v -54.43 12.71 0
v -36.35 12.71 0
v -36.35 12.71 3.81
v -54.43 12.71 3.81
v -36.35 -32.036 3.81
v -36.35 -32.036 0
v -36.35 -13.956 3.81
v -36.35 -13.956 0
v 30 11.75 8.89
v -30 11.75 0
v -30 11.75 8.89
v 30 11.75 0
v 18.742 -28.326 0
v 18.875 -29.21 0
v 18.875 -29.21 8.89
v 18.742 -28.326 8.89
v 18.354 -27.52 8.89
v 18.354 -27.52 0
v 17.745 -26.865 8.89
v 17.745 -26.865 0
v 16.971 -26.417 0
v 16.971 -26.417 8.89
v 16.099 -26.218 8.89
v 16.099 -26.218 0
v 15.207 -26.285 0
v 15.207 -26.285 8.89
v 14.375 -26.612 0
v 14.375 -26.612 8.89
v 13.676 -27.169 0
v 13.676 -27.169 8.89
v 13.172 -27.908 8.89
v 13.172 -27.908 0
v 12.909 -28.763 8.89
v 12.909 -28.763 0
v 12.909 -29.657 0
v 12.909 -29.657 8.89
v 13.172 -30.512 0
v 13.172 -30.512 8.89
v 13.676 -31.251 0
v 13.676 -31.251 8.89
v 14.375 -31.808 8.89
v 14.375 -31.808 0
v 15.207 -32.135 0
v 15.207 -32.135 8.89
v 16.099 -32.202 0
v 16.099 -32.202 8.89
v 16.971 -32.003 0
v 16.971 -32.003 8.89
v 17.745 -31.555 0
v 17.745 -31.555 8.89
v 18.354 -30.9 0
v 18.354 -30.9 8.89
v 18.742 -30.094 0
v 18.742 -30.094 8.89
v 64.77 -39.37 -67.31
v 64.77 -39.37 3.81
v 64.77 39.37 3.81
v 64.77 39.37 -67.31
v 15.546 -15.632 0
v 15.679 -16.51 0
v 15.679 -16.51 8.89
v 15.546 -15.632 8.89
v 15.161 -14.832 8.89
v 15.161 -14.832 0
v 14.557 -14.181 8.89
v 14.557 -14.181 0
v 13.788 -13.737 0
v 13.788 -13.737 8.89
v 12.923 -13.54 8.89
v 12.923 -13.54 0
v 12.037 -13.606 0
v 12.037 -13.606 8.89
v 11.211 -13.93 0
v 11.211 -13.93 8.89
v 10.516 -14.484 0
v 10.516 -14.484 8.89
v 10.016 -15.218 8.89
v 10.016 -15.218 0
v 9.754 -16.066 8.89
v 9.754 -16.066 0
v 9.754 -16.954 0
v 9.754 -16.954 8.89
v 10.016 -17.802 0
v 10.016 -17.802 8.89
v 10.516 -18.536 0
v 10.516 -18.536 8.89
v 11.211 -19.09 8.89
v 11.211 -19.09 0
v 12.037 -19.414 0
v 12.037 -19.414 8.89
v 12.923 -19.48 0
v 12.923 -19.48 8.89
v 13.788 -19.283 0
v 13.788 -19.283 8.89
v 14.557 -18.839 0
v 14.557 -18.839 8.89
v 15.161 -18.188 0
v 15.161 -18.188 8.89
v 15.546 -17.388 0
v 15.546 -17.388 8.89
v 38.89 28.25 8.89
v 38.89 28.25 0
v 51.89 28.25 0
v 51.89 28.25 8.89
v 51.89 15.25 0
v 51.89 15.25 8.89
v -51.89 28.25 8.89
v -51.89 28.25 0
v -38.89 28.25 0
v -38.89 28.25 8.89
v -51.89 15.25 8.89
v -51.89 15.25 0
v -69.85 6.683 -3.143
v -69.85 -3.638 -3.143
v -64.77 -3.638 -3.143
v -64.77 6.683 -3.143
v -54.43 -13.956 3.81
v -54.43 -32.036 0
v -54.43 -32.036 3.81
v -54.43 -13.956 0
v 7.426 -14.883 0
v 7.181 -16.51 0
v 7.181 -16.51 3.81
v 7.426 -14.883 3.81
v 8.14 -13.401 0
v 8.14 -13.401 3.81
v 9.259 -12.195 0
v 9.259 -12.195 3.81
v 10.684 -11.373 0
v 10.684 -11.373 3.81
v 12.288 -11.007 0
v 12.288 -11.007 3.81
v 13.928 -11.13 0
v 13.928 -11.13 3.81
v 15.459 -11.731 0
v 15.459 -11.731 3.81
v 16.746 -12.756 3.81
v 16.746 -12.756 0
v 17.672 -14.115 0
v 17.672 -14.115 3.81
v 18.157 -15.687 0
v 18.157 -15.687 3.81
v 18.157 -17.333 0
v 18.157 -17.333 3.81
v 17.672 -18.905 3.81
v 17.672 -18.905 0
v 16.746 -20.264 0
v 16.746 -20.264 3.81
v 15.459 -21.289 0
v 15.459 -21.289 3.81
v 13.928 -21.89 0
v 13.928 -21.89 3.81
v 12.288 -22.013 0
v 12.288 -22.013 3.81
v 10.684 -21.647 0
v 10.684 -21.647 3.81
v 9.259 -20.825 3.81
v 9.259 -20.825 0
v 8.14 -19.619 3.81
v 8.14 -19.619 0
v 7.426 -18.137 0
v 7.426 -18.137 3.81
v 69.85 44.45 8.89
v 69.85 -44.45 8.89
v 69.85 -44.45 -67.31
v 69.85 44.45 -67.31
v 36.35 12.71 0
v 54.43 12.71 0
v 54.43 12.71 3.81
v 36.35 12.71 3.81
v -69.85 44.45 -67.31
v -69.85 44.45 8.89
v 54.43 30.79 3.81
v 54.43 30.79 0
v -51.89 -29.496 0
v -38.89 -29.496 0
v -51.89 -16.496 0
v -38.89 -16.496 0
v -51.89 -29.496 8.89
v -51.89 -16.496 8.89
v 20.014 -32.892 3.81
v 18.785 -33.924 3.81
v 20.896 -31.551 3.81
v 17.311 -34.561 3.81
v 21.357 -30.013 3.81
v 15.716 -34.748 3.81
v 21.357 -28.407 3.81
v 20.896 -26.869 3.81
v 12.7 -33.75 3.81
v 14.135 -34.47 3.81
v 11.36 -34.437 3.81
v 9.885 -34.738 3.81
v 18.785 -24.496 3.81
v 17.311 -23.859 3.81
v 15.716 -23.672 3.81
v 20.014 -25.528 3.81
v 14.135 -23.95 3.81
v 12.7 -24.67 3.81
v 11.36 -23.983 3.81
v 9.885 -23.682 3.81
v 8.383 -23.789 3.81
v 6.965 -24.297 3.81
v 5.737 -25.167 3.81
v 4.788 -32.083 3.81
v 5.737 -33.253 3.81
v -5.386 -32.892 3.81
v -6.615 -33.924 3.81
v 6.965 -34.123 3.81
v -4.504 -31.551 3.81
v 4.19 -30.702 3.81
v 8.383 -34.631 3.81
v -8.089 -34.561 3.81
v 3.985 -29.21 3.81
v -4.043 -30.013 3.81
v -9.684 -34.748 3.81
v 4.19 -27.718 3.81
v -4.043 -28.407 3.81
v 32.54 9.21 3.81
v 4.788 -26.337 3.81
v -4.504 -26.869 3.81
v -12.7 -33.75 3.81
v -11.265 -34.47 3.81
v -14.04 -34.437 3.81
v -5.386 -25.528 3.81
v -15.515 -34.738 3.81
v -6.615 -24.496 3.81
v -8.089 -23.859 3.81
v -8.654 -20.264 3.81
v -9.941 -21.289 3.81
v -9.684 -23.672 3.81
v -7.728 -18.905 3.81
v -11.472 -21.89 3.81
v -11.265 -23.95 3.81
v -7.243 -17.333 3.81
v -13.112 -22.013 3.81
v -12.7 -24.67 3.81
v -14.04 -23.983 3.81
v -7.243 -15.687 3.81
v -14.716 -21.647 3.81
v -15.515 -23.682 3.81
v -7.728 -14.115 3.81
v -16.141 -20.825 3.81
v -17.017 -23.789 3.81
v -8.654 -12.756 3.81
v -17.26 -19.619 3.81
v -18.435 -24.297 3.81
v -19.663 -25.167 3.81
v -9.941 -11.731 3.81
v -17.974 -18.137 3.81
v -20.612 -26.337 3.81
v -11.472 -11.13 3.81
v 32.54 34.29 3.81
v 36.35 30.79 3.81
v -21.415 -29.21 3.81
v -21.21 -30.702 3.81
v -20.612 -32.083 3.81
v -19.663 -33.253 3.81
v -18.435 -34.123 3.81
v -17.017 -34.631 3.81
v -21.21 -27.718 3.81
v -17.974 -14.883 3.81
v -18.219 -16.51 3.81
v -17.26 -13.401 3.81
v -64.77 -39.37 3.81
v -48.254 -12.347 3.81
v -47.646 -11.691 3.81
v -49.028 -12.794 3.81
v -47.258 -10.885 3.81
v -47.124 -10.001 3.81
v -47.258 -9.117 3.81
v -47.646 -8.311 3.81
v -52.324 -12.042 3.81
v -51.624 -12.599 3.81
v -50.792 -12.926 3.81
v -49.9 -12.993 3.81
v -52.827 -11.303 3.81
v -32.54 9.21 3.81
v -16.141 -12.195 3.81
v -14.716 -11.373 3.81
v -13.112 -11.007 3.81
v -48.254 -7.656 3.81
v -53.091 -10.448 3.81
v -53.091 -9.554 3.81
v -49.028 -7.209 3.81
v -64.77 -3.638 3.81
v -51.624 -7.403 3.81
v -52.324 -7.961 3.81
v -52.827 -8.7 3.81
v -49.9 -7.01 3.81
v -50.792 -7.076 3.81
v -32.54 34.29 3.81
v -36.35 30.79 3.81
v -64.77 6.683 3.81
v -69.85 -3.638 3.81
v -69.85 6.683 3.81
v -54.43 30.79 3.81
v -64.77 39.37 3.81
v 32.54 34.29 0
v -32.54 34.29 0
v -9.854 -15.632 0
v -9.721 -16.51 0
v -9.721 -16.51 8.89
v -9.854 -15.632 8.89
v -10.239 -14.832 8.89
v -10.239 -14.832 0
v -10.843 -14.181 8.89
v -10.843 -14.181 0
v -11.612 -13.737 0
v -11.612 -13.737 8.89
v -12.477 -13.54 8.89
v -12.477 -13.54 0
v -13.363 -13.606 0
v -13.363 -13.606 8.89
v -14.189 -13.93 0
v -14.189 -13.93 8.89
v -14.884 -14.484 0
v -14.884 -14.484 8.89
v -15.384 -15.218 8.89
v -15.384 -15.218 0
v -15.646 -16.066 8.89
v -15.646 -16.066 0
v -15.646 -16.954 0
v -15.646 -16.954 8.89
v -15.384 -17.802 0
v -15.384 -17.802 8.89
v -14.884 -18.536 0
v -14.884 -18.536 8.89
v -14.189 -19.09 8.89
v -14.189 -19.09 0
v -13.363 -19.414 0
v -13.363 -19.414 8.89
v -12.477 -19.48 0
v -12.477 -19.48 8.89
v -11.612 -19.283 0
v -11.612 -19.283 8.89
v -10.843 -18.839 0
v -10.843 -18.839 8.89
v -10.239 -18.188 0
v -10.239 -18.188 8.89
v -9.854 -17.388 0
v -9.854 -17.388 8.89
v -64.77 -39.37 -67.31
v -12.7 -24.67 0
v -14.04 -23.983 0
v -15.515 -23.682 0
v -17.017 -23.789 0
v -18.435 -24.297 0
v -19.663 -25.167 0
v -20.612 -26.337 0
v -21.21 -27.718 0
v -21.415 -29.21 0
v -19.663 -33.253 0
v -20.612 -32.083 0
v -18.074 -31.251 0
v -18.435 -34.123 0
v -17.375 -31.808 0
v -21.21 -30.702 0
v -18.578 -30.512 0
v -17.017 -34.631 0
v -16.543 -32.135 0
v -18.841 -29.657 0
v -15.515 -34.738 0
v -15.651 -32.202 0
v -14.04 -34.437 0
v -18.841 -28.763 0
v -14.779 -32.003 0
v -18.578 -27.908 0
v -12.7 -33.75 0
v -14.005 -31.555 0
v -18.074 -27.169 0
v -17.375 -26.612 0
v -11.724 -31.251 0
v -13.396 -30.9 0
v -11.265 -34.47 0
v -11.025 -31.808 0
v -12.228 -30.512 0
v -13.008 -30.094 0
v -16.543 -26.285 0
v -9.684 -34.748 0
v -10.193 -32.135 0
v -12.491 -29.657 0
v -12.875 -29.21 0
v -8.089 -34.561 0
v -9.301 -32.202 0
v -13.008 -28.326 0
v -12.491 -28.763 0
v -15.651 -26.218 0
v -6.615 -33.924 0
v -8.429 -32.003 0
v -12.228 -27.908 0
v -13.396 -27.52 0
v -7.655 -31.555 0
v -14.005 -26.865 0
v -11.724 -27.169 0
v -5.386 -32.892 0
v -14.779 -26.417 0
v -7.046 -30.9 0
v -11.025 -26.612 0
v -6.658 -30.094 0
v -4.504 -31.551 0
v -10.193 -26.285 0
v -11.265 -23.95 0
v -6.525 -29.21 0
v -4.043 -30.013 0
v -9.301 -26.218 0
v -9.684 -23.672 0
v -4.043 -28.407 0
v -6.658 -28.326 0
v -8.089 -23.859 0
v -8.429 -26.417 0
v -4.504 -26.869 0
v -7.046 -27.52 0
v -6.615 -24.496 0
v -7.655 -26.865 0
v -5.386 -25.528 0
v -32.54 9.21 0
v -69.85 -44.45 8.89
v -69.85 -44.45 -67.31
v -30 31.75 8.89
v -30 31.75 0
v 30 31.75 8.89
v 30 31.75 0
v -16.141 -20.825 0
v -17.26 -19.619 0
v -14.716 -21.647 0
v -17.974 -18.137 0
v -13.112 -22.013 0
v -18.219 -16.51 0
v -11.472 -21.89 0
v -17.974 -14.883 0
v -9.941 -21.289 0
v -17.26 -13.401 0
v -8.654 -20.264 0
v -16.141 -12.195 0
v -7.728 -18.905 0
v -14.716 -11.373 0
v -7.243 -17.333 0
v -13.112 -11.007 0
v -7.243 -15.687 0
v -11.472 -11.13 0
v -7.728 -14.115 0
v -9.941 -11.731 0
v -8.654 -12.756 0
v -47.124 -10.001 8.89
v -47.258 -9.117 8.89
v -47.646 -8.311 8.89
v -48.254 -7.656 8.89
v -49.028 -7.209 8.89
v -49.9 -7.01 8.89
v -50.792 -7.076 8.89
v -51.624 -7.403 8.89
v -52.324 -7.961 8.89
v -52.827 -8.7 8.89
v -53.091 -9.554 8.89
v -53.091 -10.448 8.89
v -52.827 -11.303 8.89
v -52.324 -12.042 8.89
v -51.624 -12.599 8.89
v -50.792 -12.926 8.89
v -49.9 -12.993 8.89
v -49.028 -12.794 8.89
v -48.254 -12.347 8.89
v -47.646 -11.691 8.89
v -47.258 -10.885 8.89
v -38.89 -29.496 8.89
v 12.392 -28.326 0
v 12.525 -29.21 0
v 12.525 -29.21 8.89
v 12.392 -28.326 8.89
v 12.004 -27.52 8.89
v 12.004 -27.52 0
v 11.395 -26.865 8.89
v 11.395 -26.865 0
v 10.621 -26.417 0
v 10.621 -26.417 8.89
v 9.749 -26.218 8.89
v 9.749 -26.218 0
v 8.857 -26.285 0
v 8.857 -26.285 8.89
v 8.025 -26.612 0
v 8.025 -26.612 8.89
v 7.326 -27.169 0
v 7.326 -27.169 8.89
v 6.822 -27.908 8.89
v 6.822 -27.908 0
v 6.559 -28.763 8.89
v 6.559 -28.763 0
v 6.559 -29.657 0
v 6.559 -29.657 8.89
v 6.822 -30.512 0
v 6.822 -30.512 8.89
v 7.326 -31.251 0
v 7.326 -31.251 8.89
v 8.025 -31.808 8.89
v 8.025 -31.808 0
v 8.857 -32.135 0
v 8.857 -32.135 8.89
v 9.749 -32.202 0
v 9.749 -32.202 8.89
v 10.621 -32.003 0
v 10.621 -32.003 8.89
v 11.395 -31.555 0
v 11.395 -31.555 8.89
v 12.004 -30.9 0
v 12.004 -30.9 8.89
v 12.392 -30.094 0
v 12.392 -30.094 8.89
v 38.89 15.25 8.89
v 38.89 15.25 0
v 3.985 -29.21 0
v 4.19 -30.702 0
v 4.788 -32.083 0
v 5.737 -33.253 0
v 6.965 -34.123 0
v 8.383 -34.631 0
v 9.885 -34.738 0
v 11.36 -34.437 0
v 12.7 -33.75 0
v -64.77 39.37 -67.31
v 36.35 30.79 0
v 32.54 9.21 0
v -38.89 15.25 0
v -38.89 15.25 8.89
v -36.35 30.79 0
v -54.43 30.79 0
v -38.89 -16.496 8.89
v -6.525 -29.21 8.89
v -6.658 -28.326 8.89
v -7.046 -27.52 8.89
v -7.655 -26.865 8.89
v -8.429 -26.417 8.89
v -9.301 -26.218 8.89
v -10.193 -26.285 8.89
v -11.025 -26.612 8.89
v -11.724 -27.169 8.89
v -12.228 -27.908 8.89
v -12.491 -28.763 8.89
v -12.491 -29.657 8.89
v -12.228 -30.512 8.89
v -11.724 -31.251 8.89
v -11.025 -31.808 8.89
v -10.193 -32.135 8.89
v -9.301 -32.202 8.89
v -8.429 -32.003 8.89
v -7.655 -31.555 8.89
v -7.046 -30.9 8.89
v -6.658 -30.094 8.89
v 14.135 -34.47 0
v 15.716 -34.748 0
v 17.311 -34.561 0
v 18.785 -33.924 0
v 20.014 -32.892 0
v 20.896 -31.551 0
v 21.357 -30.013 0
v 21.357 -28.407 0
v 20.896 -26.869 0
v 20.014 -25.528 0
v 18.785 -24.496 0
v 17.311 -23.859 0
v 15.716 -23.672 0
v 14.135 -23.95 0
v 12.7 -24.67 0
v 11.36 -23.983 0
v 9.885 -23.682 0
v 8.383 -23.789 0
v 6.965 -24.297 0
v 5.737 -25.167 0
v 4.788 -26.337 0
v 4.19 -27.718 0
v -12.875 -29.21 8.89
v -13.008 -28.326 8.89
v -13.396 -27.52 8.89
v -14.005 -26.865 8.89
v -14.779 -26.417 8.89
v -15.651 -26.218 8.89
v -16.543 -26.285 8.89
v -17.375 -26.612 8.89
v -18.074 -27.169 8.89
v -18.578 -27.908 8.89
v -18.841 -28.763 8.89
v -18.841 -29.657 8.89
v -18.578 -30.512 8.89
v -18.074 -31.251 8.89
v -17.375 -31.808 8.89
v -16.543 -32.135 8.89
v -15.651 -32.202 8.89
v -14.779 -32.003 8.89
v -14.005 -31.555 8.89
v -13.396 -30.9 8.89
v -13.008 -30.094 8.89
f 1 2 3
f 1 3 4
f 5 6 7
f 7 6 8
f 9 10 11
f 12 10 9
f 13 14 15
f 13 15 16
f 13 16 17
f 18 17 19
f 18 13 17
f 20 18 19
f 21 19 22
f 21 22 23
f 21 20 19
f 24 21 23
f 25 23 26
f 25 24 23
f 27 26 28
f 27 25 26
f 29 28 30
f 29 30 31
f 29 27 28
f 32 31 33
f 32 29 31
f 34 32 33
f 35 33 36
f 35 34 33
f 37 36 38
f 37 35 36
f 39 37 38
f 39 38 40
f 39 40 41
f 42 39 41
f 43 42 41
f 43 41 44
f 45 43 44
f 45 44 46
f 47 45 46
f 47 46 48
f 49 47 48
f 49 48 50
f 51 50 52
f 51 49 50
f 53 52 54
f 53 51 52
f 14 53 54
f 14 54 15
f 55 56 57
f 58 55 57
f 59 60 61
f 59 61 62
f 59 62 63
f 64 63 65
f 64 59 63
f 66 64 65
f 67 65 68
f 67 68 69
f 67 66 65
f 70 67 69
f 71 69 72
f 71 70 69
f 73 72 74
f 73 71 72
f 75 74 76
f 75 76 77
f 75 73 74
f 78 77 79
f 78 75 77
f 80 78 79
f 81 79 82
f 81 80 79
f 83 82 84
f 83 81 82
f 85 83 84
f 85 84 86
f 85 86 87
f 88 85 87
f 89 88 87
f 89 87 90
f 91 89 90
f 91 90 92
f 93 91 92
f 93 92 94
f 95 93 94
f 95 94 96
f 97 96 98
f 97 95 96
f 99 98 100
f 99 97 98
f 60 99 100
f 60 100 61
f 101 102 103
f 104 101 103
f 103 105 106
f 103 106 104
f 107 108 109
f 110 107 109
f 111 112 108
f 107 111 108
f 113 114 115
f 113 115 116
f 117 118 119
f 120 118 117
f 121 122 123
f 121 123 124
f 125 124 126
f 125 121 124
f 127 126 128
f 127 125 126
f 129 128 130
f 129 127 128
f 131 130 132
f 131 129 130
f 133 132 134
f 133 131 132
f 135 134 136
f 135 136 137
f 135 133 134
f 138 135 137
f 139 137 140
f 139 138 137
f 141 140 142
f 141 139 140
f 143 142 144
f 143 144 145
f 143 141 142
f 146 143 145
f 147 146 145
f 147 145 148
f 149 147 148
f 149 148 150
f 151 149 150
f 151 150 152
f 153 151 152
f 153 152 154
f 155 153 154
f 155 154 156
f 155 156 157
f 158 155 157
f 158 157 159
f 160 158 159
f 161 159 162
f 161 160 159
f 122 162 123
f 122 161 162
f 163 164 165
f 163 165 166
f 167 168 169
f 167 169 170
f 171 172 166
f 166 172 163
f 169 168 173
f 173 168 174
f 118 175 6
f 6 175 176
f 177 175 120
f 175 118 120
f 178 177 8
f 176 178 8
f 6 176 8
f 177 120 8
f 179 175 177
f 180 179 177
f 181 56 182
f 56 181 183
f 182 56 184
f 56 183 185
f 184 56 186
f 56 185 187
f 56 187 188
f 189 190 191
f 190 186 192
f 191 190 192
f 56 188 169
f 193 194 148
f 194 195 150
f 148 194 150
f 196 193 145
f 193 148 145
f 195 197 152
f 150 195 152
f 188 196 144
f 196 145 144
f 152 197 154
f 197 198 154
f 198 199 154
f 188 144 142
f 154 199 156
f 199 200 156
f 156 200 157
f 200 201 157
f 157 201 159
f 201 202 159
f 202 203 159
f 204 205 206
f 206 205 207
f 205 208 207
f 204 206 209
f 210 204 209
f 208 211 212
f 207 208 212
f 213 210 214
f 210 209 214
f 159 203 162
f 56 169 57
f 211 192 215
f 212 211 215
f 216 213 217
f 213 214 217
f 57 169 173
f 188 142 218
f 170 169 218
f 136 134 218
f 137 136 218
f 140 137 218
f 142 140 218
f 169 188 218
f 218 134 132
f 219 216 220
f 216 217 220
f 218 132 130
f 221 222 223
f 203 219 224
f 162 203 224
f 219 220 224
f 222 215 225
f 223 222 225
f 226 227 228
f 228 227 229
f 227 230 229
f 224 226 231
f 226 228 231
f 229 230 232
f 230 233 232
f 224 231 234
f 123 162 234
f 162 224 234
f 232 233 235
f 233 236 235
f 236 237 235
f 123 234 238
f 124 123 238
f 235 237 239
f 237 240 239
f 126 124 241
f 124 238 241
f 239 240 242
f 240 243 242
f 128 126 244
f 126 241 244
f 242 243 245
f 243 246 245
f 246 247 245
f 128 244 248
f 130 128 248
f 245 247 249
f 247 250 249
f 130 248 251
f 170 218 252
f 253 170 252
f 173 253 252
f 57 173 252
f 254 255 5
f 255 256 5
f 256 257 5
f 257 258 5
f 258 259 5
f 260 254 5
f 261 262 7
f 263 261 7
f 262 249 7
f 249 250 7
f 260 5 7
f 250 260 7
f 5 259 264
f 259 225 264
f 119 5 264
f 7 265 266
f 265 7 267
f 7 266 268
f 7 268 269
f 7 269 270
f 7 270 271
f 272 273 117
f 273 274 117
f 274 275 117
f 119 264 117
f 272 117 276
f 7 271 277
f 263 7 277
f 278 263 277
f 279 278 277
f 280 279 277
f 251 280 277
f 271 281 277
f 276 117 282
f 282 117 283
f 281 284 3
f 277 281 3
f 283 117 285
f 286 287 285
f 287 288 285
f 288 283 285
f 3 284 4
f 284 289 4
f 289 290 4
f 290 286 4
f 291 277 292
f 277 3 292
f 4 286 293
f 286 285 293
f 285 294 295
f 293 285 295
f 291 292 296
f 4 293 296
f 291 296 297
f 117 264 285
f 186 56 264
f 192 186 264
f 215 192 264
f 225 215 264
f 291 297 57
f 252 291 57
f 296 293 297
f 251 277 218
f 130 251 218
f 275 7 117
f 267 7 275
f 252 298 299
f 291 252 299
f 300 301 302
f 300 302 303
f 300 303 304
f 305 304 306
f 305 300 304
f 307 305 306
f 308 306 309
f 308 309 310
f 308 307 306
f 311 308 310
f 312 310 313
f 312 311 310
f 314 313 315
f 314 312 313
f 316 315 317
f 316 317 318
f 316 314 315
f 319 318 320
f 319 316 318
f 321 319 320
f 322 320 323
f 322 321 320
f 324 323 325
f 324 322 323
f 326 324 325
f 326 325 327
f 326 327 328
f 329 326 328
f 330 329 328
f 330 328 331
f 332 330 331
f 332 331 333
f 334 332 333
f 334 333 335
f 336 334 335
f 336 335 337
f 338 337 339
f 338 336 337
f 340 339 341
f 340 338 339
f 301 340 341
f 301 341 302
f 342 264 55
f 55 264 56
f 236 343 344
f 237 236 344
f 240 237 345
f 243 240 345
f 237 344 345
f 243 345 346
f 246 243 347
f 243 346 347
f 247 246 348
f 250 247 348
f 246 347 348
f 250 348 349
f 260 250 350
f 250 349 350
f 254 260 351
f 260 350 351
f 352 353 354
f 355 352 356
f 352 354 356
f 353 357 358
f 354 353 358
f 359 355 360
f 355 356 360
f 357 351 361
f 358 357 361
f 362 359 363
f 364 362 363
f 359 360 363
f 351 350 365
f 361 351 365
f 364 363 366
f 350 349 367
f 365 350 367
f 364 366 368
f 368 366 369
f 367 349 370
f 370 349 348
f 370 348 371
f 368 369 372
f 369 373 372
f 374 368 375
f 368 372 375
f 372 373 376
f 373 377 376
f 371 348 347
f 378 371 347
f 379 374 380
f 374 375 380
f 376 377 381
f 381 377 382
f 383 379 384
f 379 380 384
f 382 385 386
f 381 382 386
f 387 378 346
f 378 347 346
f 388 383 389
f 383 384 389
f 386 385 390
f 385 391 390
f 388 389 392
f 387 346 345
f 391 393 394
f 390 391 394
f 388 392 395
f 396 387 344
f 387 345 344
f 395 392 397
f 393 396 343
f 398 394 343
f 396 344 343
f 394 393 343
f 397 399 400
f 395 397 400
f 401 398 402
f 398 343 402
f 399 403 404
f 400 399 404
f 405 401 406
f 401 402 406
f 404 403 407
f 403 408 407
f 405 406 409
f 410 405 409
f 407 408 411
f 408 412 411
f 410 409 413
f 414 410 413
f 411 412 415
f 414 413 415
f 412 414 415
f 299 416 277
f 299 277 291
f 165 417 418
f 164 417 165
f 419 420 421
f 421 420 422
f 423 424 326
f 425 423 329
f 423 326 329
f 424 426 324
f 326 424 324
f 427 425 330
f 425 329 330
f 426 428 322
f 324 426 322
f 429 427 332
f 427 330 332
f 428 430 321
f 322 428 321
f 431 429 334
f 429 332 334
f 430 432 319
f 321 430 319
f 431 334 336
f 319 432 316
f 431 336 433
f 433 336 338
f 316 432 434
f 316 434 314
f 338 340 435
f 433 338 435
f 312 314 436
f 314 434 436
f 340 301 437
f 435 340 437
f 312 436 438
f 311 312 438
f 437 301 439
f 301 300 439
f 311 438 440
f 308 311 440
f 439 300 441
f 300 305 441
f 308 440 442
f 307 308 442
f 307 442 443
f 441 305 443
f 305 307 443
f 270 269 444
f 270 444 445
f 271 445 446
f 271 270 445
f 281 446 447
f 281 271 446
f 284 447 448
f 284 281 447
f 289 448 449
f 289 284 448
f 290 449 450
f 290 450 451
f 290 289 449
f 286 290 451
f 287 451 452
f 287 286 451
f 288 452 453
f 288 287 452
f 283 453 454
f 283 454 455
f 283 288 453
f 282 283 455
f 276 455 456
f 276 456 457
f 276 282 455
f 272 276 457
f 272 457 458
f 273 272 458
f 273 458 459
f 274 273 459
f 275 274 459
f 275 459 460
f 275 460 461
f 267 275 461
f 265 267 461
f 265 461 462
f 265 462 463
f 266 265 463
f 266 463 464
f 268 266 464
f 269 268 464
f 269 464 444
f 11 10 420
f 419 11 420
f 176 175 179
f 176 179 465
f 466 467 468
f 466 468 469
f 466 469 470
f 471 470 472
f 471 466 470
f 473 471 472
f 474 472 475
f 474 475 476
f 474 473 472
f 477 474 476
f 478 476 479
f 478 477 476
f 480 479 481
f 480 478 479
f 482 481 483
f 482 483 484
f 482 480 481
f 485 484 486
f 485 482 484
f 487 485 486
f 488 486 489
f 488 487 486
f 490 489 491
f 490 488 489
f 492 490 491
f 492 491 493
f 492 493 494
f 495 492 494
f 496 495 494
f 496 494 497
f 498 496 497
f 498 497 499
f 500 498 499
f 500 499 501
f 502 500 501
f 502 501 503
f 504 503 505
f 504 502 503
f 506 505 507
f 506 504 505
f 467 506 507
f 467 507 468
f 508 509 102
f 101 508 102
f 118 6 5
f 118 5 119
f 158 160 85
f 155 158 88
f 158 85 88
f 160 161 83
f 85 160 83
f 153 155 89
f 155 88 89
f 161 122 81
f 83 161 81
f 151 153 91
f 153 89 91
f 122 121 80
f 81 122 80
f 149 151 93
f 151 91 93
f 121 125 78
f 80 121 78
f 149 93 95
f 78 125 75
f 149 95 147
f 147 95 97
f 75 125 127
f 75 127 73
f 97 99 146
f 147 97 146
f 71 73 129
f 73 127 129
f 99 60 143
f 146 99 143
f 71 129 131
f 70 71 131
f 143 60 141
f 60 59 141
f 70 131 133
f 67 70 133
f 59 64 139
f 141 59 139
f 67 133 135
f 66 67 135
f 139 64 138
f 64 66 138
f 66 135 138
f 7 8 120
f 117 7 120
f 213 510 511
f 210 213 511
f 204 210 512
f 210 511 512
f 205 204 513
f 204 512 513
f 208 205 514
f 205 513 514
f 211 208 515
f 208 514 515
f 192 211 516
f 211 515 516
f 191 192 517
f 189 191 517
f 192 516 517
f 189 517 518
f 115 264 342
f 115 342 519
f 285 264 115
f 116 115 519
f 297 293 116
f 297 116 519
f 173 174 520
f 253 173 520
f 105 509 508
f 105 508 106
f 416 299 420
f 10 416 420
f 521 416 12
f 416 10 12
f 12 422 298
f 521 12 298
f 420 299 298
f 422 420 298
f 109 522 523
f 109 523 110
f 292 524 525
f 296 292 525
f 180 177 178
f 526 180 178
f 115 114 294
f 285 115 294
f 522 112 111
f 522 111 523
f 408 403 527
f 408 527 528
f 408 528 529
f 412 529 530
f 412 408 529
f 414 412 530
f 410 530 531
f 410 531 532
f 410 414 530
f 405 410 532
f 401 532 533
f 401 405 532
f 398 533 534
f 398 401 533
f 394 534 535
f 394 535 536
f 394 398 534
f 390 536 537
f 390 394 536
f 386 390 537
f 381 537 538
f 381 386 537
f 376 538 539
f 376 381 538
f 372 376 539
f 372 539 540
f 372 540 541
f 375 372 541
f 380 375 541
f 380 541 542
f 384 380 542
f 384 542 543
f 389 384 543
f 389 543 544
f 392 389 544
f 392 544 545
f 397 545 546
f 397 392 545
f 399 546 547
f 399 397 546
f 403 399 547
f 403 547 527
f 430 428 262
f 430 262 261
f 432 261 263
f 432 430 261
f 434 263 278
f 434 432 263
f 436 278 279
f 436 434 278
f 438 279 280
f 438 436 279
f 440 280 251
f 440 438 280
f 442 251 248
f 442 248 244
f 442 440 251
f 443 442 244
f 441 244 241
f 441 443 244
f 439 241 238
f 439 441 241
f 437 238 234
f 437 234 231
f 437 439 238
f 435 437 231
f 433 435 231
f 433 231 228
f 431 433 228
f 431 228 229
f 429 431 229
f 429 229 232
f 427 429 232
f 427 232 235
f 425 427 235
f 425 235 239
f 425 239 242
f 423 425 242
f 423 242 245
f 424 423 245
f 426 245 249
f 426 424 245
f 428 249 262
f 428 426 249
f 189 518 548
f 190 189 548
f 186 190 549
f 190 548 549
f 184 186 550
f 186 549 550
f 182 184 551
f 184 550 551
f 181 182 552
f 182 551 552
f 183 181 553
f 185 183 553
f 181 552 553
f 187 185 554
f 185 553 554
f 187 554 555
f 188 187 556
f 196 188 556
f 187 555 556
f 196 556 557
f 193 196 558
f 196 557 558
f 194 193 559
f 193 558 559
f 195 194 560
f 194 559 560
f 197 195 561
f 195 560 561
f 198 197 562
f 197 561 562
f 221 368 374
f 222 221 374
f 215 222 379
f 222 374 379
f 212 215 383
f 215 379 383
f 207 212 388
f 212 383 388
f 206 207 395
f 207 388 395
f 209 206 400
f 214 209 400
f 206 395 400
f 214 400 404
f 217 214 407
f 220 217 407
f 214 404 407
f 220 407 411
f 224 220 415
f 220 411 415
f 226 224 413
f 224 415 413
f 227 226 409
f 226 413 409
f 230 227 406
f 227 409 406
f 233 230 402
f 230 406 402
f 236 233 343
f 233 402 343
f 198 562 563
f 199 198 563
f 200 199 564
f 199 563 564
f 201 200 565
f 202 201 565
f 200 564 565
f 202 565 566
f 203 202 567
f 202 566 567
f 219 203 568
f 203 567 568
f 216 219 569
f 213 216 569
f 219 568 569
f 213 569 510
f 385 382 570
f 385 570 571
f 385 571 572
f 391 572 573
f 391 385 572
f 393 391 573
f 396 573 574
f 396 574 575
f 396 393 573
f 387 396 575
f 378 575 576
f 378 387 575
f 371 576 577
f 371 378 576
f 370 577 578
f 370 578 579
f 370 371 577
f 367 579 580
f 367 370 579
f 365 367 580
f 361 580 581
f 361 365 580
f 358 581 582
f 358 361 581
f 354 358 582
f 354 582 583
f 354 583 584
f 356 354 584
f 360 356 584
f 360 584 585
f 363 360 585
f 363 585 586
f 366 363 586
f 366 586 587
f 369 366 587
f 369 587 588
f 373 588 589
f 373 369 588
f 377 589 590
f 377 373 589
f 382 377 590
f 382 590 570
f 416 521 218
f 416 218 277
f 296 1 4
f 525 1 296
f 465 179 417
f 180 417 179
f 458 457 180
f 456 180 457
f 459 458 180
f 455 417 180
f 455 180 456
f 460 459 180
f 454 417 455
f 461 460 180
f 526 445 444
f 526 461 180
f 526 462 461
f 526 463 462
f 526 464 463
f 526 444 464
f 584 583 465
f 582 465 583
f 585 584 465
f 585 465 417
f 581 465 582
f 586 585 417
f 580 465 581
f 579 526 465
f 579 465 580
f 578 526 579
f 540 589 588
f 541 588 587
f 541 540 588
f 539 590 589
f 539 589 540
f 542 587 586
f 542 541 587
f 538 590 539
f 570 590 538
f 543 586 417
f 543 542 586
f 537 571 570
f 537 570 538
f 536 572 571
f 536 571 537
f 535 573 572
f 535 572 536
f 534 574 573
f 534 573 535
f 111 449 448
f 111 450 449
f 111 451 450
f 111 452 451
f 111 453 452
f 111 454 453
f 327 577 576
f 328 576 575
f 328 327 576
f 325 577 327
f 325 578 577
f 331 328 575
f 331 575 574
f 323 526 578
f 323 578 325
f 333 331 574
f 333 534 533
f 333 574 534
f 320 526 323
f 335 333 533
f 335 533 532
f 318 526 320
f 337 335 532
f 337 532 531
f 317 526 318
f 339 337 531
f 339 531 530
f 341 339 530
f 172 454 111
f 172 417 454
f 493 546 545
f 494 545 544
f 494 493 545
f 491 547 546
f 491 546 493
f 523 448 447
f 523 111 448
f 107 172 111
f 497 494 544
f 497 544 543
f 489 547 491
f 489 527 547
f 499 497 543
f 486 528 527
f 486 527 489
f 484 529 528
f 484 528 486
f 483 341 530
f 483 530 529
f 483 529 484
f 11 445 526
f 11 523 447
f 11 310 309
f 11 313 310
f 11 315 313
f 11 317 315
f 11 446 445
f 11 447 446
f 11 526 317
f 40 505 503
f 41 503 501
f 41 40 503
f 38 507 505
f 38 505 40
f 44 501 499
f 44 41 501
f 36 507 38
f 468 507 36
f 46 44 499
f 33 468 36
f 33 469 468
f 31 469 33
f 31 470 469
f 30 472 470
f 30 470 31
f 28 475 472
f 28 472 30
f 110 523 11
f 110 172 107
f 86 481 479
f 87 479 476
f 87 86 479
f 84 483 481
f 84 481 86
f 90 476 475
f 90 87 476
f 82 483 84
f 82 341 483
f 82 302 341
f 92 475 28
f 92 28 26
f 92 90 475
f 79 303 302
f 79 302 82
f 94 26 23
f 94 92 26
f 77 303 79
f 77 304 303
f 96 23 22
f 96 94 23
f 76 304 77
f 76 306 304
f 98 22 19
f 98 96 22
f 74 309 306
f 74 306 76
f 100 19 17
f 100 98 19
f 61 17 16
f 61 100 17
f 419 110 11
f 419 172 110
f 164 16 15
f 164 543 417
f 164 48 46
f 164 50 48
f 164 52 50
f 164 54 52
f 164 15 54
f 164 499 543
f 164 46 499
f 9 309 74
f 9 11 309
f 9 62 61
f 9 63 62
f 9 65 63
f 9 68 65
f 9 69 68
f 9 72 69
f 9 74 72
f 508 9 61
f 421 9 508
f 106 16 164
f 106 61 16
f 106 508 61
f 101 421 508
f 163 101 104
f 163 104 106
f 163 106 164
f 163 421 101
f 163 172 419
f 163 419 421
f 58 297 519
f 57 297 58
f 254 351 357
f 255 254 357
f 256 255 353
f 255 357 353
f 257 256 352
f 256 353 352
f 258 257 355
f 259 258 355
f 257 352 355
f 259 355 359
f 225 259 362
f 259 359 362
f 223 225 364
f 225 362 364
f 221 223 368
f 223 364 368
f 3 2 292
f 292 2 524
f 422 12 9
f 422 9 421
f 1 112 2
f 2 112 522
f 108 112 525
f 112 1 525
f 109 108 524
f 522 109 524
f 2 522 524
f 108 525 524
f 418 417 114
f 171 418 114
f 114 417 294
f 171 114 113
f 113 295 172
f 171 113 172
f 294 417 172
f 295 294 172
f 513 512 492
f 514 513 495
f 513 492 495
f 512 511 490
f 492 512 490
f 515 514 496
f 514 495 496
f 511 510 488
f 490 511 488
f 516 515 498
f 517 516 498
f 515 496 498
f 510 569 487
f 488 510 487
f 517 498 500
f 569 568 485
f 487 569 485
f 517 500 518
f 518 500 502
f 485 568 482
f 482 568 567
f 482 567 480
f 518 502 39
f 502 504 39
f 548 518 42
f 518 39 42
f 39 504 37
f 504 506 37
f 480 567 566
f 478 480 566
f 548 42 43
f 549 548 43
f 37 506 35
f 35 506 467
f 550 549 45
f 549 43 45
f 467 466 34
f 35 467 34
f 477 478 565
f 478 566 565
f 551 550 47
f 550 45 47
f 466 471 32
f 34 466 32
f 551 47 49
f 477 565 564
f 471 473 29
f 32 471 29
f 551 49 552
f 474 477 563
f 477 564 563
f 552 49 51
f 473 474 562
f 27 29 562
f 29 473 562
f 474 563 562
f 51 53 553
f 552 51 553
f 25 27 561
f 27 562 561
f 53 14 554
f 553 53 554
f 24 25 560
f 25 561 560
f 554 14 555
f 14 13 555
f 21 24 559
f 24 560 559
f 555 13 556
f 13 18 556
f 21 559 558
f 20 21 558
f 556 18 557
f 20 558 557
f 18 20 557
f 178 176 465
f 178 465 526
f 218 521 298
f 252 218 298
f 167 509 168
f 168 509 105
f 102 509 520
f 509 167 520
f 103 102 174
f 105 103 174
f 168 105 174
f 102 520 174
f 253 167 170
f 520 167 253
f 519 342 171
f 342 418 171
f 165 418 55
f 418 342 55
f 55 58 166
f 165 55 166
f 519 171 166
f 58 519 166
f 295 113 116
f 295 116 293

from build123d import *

# Parameters (mm, degrees)
SKETCH1_W           = 127
SKETCH1_H           = 76.2
SKETCH1_R           = 2.978797174
SKETCH1_R_2         = 3
SKETCH1_W_2         = 60
SKETCH1_H_2         = 20
SKETCH1_W_3         = 13
SKETCH1_H_3         = 13
BOSS_EXTRUDE1_DEPTH = 8.89
SKETCH3_W           = 127
SKETCH3_H           = 76.2
SKETCH3_R           = 5.518797174
SKETCH3_W_2         = 18.08
SKETCH3_H_2         = 18.08
SKETCH3_R_2         = 3
SKETCH3_W_3         = 65.08
SKETCH3_H_3         = 25.08
CUT_EXTRUDE1_DEPTH  = 3.81
BOSS_EXTRUDE2_START = -5.08
SKETCH5_W           = 129.54
SKETCH5_H           = 78.74
SKETCH5_W_2         = 127
SKETCH5_H_2         = 76.2
BOSS_EXTRUDE2_DEPTH = 5.08
SKETCH6_W           = 139.7
SKETCH6_H           = 88.9
SKETCH6_W_2         = 129.54
SKETCH6_H_2         = 78.74
BOSS_EXTRUDE3_DEPTH = 76.2
CUT_EXTRUDE3_REACH  = 141.7
SKETCH7_W           = 6.952697557
SKETCH7_H           = 10.320960494


with BuildPart() as part:
    # Sketch1 → Boss-Extrude1 (new body)
    with BuildSketch(Plane.XY):
        Rectangle(SKETCH1_W, SKETCH1_H)
        with Locations((-12.7, -16.51)):
            Circle(SKETCH1_R, mode=Mode.SUBTRACT)
        with Locations((12.7, -16.51)):
            Circle(SKETCH1_R, mode=Mode.SUBTRACT)
        with Locations((-15.875, -29.21)):
            Circle(SKETCH1_R_2, mode=Mode.SUBTRACT)
        with Locations((-9.525, -29.21)):
            Circle(SKETCH1_R_2, mode=Mode.SUBTRACT)
        with Locations((9.525, -29.21)):
            Circle(SKETCH1_R_2, mode=Mode.SUBTRACT)
        with Locations((15.875, -29.21)):
            Circle(SKETCH1_R_2, mode=Mode.SUBTRACT)
        with Locations((-50.124380999, -10.001211499)):
            Circle(SKETCH1_R_2, mode=Mode.SUBTRACT)
        with Locations((0, 21.75)):
            Rectangle(SKETCH1_W_2, SKETCH1_H_2, mode=Mode.SUBTRACT)
        with Locations((-45.39, 21.75)):
            Rectangle(SKETCH1_W_3, SKETCH1_H_3, mode=Mode.SUBTRACT)
        with Locations((45.39, 21.75)):
            Rectangle(SKETCH1_W_3, SKETCH1_H_3, mode=Mode.SUBTRACT)
        with Locations((-45.39, -22.996165479)):
            Rectangle(SKETCH1_W_3, SKETCH1_H_3, mode=Mode.SUBTRACT)
    extrude(amount=BOSS_EXTRUDE1_DEPTH)

    # Sketch3 → Cut-Extrude1 (cut)
    with BuildSketch(Plane(origin=(0, 0, 0), x_dir=(-1, 0, 0), z_dir=(0, 0, -1))):
        Rectangle(SKETCH3_W, SKETCH3_H)
        with BuildLine():
            ThreePointArc((-12.7, -24.670068833), (-6.965498095, -24.296696631), (-3.985, -29.21))
            ThreePointArc((-3.985, -29.21), (-6.965498095, -34.123303369), (-12.7, -33.749931167))
            ThreePointArc((-12.7, -33.749931167), (-21.415, -29.21), (-12.7, -24.670068833))
        make_face(mode=Mode.SUBTRACT)
        with Locations((-12.7, -16.51)):
            Circle(SKETCH3_R, mode=Mode.SUBTRACT)
        with BuildLine():
            ThreePointArc((12.7, -24.670068833), (18.434501905, -24.296696631), (21.415, -29.21))
            ThreePointArc((21.415, -29.21), (18.434501905, -34.123303369), (12.7, -33.749931167))
            ThreePointArc((12.7, -33.749931167), (3.985, -29.21), (12.7, -24.670068833))
        make_face(mode=Mode.SUBTRACT)
        with Locations((45.39, -22.996165479)):
            Rectangle(SKETCH3_W_2, SKETCH3_H_2, mode=Mode.SUBTRACT)
        with Locations((12.7, -16.51)):
            Circle(SKETCH3_R, mode=Mode.SUBTRACT)
        with Locations((50.124380999, -10.001211499)):
            Circle(SKETCH3_R_2, mode=Mode.SUBTRACT)
        with Locations((-45.39, 21.75)):
            Rectangle(SKETCH3_W_2, SKETCH3_H_2, mode=Mode.SUBTRACT)
        with Locations((0, 21.75)):
            Rectangle(SKETCH3_W_3, SKETCH3_H_3, mode=Mode.SUBTRACT)
        with Locations((45.39, 21.75)):
            Rectangle(SKETCH3_W_2, SKETCH3_H_2, mode=Mode.SUBTRACT)
    extrude(amount=-CUT_EXTRUDE1_DEPTH, mode=Mode.SUBTRACT)

    # Sketch5 → Boss-Extrude2 (add)
    with BuildSketch(Plane.XY.offset(8.89).offset(BOSS_EXTRUDE2_START)):
        Rectangle(SKETCH5_W, SKETCH5_H)
        Rectangle(SKETCH5_W_2, SKETCH5_H_2, mode=Mode.SUBTRACT)
    extrude(amount=BOSS_EXTRUDE2_DEPTH)

    # Sketch6 → Boss-Extrude3 (add)
    with BuildSketch(Plane.XY.offset(8.89)):
        Rectangle(SKETCH6_W, SKETCH6_H)
        Rectangle(SKETCH6_W_2, SKETCH6_H_2, mode=Mode.SUBTRACT)
    extrude(amount=-BOSS_EXTRUDE3_DEPTH)

    # Sketch7 → Cut-Extrude3 (cut, up to next)
    with BuildSketch(Plane.ZY.offset(69.85), mode=Mode.PRIVATE) as cut_extrude3_sk1:
        with Locations((0.333651222, 1.522792989)):
            Rectangle(SKETCH7_W, SKETCH7_H)
    cut_extrude3_tool1 = extrude(cut_extrude3_sk1.sketch, amount=-CUT_EXTRUDE3_REACH, mode=Mode.PRIVATE) & part.part
    add(cut_extrude3_tool1.solids().sort_by_distance((-69.85, 1.522793, 0.333651))[0], mode=Mode.SUBTRACT)


solid = part.part
